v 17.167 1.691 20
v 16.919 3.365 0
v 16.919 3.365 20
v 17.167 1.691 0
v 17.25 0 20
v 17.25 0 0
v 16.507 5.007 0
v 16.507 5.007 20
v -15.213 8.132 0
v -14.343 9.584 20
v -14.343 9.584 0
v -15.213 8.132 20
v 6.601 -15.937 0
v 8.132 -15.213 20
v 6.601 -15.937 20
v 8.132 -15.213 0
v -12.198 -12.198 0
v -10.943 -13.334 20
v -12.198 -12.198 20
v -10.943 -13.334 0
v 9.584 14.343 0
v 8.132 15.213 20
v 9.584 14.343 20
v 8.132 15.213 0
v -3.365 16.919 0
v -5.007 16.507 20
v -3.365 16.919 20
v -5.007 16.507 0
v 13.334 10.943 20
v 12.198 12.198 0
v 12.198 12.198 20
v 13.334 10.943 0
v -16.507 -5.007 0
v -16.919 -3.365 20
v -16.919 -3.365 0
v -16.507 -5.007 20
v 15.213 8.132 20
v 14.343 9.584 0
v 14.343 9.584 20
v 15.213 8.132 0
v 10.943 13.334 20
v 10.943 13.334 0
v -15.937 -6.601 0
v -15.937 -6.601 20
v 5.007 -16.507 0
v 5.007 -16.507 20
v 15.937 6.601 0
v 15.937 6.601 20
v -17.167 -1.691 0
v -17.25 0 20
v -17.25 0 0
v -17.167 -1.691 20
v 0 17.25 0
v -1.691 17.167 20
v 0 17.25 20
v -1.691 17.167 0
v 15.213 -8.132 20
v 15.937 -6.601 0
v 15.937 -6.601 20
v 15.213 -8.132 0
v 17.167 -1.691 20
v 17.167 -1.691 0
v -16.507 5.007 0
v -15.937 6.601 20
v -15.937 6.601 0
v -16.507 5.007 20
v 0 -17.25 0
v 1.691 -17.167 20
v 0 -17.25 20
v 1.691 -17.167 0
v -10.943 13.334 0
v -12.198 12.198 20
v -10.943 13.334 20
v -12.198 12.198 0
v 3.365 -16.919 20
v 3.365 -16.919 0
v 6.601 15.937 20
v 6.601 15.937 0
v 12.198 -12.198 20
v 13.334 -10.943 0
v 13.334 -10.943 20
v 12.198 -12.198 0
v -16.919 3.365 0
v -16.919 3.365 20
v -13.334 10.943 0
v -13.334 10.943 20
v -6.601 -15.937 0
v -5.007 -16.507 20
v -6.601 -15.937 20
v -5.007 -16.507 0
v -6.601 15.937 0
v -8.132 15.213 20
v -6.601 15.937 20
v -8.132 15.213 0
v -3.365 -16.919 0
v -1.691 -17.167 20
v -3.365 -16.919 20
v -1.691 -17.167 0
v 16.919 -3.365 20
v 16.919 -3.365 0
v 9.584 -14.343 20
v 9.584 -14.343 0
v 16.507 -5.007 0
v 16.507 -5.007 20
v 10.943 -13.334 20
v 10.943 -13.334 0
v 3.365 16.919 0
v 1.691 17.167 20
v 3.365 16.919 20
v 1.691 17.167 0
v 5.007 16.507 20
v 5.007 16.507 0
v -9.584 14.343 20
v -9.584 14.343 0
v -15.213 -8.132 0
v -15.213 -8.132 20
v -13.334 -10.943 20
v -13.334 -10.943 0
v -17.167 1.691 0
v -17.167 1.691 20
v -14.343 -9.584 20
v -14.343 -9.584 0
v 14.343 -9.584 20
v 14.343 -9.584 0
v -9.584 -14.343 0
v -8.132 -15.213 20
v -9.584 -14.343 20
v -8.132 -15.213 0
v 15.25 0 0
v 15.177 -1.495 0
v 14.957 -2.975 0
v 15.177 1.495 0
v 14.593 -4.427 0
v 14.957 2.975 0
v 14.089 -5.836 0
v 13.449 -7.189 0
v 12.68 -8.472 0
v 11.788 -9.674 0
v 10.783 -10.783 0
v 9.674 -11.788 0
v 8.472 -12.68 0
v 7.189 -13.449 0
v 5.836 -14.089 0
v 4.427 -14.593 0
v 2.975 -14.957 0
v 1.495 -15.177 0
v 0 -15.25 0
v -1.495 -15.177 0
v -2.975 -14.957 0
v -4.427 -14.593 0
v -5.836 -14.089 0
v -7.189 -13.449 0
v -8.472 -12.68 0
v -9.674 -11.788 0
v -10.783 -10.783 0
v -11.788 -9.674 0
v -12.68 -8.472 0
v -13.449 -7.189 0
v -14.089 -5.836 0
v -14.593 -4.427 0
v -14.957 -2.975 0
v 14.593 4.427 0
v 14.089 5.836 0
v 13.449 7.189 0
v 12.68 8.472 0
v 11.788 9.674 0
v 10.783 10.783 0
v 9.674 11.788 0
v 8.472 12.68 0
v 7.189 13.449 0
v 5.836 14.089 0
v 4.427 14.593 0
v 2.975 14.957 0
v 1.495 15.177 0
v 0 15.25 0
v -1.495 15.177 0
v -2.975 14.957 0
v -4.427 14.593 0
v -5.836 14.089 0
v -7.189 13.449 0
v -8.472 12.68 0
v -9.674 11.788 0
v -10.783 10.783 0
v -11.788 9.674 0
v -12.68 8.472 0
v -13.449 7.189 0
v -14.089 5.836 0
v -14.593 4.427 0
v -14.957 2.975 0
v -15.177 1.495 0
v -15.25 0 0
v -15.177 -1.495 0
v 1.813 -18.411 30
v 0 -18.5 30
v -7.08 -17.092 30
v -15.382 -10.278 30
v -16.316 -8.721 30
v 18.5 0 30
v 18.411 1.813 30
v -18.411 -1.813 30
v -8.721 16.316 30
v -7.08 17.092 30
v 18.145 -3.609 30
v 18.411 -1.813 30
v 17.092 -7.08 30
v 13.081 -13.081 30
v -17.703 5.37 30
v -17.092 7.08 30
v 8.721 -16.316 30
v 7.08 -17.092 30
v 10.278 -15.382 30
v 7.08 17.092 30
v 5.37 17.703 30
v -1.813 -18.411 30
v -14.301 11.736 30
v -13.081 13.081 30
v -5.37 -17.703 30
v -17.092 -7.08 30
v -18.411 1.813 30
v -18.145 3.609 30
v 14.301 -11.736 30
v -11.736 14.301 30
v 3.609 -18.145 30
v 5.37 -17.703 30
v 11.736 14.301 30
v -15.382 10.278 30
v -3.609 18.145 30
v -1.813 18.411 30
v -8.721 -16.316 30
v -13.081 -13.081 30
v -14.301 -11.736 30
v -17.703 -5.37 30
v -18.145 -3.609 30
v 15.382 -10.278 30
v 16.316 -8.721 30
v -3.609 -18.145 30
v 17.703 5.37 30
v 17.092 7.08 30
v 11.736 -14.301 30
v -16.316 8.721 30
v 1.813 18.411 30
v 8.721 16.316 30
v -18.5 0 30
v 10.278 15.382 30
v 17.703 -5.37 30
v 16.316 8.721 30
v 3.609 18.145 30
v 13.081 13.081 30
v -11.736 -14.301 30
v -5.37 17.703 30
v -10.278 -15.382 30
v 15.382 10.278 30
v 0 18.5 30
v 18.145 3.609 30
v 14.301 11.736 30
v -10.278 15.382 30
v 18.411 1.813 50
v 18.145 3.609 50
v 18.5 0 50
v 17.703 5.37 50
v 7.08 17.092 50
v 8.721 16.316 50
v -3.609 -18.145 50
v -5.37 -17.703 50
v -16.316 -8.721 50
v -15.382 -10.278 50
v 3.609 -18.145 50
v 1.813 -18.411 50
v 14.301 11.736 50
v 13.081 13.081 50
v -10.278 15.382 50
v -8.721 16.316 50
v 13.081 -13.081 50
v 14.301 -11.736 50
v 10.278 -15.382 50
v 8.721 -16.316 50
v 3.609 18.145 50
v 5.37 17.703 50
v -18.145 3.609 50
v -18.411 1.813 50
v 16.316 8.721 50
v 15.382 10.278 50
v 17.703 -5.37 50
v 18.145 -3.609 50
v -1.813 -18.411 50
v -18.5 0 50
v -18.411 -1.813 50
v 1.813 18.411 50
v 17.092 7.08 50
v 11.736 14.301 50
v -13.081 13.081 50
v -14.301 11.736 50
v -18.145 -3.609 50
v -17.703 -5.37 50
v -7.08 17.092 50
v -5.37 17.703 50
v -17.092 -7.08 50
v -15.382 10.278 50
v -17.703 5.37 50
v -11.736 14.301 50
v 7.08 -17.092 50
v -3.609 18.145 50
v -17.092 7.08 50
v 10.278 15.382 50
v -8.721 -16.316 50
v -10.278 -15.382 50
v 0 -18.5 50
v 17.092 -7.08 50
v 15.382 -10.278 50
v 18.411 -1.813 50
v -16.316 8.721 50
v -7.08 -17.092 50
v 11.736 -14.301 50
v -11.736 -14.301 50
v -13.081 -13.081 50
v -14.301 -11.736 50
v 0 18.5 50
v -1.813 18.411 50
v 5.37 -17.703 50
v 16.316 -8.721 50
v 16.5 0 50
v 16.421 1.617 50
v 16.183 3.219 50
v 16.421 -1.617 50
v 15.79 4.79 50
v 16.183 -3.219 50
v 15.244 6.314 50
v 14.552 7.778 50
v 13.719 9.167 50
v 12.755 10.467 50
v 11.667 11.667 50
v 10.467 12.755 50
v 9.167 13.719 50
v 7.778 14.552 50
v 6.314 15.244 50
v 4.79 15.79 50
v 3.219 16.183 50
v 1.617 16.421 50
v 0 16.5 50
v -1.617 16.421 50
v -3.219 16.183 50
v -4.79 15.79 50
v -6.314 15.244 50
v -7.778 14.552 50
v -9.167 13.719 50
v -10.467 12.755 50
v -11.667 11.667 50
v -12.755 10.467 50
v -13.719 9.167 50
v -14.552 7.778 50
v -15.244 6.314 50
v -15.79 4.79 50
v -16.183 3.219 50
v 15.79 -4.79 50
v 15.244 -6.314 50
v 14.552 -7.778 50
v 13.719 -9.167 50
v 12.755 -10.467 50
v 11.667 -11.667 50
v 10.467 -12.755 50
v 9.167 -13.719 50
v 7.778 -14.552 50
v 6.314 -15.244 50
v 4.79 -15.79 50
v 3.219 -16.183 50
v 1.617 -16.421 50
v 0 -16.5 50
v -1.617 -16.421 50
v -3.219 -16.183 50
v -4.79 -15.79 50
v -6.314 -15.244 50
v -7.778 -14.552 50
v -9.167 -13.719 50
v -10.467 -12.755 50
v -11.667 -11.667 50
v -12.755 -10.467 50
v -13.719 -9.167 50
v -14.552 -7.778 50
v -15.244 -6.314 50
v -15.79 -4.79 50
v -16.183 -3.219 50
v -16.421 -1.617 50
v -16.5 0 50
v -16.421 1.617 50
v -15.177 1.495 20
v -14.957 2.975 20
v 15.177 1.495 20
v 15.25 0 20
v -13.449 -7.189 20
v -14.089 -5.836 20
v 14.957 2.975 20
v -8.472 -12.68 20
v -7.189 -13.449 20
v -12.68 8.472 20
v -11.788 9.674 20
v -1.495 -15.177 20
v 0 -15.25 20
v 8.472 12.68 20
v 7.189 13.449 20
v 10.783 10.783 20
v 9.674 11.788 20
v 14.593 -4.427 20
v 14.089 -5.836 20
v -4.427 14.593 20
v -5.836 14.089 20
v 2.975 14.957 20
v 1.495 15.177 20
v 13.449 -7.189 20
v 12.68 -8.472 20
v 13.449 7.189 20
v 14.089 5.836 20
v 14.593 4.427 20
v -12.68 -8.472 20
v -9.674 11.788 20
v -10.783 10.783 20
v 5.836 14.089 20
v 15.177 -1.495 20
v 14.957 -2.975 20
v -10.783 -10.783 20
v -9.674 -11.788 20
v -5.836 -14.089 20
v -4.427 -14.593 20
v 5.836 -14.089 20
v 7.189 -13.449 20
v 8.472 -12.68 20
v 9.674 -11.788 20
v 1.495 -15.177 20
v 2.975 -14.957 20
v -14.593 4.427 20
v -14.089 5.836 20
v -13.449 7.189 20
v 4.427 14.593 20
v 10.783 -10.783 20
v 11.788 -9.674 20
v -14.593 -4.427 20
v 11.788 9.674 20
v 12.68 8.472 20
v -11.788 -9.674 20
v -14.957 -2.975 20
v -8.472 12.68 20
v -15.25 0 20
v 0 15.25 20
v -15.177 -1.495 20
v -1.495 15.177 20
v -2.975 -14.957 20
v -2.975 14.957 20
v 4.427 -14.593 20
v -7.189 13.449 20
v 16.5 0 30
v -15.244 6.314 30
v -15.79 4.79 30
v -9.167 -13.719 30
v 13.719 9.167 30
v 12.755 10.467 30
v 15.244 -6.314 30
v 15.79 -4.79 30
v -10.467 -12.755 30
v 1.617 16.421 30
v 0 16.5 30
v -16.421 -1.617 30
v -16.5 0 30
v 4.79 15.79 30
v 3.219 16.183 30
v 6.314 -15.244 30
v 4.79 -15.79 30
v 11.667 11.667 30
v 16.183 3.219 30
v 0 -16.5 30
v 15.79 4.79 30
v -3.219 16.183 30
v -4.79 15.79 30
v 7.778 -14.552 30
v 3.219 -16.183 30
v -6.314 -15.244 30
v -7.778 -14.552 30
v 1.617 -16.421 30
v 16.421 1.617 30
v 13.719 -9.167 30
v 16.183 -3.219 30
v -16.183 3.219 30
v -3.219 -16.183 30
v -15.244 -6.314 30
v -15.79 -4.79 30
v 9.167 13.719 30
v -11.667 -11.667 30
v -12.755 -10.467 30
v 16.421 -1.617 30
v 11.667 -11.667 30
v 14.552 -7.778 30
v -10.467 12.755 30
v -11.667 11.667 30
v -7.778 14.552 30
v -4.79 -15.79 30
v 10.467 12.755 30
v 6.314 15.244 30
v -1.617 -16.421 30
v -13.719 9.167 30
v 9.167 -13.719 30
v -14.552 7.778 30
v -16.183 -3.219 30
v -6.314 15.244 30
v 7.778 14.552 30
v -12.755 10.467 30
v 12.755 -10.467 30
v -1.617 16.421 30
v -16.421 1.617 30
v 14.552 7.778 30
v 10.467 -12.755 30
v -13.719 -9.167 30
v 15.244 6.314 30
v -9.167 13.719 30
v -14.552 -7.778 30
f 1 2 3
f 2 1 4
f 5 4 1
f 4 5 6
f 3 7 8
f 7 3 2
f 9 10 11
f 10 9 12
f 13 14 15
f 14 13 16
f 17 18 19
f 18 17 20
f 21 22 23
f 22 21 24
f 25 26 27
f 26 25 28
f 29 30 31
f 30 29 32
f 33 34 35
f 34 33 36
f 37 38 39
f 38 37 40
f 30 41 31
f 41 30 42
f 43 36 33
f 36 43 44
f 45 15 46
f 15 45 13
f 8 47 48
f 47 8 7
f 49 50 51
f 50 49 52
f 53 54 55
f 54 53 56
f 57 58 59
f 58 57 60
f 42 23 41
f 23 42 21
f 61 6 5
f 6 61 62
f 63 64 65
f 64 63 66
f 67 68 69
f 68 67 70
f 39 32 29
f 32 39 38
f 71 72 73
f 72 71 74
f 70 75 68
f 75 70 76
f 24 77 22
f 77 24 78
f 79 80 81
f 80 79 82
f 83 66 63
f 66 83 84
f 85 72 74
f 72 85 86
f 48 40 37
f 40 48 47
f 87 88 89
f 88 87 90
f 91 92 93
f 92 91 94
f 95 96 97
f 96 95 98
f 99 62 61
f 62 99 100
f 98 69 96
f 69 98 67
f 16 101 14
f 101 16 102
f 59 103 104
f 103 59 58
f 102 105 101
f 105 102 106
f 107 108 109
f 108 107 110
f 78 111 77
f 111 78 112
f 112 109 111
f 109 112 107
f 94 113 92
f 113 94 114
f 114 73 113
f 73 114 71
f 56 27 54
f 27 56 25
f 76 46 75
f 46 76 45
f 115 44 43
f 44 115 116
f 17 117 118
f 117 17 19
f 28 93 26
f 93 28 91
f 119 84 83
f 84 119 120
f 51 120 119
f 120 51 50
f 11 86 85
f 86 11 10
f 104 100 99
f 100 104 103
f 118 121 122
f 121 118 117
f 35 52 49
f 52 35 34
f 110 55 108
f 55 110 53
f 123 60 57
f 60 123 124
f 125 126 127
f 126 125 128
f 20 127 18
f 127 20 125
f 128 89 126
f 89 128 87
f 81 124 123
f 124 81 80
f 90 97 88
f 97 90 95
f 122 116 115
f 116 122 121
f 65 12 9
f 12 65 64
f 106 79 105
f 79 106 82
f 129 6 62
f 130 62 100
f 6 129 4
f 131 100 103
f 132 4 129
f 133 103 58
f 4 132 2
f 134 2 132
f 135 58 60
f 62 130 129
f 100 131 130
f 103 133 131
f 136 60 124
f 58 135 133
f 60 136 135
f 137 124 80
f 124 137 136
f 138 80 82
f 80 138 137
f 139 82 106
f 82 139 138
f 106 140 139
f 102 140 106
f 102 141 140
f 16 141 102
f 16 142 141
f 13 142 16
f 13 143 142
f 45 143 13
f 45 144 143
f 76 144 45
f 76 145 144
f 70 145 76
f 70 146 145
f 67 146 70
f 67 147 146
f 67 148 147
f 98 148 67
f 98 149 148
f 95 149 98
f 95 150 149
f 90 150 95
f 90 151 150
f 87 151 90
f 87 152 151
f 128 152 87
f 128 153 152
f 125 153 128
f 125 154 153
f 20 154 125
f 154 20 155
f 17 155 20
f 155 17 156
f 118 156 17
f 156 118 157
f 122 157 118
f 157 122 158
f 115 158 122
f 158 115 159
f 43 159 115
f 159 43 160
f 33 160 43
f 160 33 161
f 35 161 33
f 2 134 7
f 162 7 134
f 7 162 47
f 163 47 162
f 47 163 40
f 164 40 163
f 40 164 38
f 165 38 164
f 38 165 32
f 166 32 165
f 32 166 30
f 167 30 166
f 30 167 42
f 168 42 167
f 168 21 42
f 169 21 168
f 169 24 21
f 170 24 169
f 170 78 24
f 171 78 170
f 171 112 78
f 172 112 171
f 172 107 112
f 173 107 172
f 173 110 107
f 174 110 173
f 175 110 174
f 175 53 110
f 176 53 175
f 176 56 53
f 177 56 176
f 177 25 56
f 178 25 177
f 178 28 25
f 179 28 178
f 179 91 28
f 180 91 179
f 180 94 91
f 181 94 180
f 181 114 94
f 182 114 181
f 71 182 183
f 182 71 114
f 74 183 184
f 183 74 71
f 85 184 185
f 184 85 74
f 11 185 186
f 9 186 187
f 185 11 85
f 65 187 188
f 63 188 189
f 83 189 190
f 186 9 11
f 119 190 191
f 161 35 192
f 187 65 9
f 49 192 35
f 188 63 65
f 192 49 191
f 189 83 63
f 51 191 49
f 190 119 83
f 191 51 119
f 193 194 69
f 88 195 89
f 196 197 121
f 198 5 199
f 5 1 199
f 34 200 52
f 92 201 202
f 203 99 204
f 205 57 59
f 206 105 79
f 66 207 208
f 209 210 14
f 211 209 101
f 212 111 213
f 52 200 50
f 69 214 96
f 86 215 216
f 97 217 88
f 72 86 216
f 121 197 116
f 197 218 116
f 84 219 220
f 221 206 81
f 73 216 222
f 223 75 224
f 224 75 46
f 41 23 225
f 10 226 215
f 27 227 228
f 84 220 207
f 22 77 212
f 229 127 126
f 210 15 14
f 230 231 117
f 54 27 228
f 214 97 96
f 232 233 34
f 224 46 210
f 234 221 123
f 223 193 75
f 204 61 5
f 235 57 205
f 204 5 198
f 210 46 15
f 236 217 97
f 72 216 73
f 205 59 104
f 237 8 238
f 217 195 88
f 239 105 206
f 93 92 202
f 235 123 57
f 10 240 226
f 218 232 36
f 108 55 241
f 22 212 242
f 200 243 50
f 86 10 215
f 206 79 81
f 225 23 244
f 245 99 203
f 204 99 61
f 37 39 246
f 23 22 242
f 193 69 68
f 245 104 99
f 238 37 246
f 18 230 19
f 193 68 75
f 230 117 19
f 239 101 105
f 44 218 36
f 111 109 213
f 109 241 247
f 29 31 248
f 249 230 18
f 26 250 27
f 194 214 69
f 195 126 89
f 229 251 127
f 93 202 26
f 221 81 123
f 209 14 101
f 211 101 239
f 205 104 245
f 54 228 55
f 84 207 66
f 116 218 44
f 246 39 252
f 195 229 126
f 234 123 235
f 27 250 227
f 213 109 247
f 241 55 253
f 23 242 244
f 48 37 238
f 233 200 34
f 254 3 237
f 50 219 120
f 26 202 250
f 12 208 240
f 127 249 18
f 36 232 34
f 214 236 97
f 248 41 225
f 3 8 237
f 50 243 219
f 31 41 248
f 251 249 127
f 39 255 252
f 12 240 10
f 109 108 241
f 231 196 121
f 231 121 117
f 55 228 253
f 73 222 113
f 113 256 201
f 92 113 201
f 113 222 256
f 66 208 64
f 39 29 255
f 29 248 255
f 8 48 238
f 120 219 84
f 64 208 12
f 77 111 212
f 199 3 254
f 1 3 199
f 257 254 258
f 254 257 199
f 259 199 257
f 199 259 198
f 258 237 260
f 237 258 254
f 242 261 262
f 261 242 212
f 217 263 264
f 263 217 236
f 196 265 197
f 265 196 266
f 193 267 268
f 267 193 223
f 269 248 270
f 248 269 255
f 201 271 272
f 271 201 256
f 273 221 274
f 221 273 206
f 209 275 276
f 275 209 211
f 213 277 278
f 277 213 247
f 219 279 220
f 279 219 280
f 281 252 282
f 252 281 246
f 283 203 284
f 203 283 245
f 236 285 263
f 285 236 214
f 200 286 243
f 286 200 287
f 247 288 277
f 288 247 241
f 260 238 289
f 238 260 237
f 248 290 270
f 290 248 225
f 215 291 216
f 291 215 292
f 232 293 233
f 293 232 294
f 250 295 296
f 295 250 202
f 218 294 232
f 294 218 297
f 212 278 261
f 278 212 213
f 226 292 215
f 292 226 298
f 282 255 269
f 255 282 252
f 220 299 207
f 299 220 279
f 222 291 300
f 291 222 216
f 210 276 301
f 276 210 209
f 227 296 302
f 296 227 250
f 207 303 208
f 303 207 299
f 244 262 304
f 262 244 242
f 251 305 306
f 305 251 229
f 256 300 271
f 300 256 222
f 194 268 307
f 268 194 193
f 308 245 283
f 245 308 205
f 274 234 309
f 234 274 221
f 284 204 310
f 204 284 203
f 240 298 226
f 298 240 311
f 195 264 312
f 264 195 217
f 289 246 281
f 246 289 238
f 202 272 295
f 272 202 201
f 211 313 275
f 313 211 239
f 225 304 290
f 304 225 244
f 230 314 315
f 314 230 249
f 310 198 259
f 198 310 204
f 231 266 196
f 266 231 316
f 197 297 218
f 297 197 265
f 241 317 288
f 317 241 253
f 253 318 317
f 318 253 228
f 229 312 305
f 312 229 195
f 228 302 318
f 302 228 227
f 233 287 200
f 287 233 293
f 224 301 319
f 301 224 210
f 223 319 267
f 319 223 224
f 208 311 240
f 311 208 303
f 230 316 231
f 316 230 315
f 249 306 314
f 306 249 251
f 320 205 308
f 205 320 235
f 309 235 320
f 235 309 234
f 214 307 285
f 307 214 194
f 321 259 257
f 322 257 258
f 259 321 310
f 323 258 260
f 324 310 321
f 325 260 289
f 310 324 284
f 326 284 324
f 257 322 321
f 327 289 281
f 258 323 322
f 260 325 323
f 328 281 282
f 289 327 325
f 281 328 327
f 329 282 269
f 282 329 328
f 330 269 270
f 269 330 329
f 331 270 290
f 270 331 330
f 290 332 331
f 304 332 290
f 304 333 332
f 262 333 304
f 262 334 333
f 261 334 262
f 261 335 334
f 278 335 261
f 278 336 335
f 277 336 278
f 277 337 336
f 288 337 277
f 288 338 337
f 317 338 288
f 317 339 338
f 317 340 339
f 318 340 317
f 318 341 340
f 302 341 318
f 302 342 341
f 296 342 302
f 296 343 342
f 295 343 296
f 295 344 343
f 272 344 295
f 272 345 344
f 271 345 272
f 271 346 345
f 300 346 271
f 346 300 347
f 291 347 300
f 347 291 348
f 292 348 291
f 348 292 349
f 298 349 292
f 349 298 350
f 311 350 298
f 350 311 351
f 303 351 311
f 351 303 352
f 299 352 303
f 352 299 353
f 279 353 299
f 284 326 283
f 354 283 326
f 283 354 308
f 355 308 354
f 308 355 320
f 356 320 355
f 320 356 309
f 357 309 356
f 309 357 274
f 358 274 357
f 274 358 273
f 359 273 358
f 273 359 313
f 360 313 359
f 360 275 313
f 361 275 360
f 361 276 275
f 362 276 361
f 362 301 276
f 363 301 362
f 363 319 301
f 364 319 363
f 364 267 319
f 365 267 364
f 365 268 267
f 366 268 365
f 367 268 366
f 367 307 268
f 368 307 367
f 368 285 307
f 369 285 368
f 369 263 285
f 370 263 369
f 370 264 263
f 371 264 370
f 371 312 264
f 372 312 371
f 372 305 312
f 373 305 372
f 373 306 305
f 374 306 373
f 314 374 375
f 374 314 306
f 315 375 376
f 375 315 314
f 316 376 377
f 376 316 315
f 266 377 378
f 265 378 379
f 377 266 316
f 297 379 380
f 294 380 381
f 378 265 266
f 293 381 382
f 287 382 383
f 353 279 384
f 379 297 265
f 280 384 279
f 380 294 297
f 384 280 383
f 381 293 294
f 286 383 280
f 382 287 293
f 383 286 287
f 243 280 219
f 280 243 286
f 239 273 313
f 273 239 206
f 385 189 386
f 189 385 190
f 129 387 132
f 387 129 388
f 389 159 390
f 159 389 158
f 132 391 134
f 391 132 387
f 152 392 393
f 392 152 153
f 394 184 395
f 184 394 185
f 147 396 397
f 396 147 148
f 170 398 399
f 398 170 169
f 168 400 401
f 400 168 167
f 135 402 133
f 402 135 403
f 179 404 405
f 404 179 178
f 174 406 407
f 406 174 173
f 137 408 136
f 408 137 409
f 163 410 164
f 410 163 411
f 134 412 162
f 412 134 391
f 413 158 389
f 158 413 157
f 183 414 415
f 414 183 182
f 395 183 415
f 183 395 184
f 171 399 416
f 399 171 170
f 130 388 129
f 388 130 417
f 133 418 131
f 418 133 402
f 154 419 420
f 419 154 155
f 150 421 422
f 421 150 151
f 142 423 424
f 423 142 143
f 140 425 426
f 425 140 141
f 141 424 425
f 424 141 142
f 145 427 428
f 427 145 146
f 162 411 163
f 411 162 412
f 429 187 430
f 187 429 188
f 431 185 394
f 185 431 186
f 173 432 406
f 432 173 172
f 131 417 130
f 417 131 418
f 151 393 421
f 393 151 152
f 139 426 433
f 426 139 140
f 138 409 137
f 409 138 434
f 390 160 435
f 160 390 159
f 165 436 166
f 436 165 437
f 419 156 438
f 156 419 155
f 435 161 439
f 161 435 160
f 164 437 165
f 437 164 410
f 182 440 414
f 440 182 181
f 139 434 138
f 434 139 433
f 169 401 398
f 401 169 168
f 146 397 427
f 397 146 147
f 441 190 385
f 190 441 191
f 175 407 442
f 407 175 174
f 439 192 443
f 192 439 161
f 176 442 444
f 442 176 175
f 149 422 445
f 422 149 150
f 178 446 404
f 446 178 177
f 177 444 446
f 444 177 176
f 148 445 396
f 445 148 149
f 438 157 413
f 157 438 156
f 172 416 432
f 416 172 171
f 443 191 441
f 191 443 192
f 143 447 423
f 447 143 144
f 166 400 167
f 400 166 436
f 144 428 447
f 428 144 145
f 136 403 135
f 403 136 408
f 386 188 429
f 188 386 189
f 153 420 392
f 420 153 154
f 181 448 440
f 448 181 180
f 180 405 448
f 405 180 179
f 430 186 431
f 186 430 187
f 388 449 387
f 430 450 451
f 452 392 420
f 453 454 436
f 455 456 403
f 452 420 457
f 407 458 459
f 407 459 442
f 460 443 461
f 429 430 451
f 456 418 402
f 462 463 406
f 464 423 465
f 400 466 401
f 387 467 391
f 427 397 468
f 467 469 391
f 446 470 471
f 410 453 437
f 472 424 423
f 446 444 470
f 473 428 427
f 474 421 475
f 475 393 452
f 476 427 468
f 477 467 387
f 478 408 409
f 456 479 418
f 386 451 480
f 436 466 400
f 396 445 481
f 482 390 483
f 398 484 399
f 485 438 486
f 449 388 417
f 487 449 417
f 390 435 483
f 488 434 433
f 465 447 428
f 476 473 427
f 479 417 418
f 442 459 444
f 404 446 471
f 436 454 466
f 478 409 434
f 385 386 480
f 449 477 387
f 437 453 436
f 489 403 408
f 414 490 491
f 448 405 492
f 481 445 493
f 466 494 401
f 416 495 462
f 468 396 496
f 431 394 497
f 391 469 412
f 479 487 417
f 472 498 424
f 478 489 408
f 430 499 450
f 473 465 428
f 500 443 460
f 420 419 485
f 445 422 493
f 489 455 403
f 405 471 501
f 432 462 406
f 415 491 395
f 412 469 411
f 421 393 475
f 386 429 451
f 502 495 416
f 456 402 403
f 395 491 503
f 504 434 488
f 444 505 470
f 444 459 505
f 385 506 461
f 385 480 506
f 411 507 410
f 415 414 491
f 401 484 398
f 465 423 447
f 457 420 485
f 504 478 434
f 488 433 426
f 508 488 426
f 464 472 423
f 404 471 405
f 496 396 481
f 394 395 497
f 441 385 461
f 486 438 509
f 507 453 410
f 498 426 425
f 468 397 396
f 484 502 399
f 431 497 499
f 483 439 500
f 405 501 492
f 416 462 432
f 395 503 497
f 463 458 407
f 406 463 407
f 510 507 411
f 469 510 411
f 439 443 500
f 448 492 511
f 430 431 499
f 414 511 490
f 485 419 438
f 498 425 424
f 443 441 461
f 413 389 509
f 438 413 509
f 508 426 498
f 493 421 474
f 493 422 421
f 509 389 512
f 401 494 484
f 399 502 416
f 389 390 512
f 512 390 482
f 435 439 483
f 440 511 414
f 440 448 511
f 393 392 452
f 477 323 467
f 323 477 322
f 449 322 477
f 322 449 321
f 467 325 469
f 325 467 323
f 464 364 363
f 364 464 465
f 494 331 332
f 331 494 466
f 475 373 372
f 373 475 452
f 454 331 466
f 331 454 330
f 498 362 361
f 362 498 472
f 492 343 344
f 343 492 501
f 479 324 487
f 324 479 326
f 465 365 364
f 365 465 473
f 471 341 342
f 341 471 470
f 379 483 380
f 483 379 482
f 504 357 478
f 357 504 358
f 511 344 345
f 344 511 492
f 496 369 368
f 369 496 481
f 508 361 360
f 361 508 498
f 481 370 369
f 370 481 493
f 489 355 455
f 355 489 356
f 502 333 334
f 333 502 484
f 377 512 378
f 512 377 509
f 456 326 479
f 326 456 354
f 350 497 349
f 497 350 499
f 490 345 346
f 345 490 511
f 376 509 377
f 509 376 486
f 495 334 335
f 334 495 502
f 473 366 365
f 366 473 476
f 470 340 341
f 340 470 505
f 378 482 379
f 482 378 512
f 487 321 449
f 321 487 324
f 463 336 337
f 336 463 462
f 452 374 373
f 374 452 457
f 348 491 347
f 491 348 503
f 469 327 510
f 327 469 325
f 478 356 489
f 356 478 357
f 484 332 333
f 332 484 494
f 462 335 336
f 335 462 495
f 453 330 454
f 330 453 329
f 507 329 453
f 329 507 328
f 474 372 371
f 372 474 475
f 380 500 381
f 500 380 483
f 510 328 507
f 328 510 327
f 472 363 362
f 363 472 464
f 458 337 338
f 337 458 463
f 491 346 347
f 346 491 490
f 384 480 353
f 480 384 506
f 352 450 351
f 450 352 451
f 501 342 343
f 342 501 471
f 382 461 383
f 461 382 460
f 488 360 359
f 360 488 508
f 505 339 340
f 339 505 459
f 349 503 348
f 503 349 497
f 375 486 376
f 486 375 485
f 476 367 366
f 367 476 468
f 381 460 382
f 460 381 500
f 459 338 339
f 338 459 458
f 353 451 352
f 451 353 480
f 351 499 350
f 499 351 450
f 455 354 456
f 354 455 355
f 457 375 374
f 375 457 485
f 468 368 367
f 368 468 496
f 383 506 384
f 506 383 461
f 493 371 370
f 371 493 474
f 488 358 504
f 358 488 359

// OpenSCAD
/**
 * Hose adapter for Makita vacuums and dust extractors.
 *
 * This adapter fits inside tool dust ports and enables them to be connected to
 * Makita vacuums. All dimensions are in millimeters.
 */

/* [Adapter] */
// Inside diameter of the tool dust port (the default fits the DeWalt DW618)
Tool_Port_Diameter = 34.5;

// Inside diameter of the Makita vacuum hose connection
Hose_Port_Diameter = 37;

// Wall thickness of the adapter shell
Wall_Thickness = 2;

// Length of each cylindrical end section
End_Length = 20;

// Length of the tapered middle section
Taper_Length = 10;

/* [Hidden] */
$fn = 64;
EPSILON = 0.02;

assert(Wall_Thickness > 0, "Wall_Thickness must be positive");
assert(2 * Wall_Thickness < Tool_Port_Diameter, "Wall_Thickness must be less than half Tool_Port_Diameter");
assert(2 * Wall_Thickness < Hose_Port_Diameter, "Wall_Thickness must be less than half Hose_Port_Diameter");

module hose_adapter(d1, d2, thickness) {
  module shell(d1, d2) {
    cylinder(h = End_Length, d = d1);
    translate([0, 0, End_Length])
      cylinder(h = Taper_Length, d1 = d1, d2 = d2);
    translate([0, 0, End_Length + Taper_Length])
      cylinder(h = End_Length, d = d2);
  }

  difference() {
    shell(d1, d2);
    translate([0, 0, -EPSILON]) {
      cylinder(h = End_Length + EPSILON, d = d1 - 2 * thickness);
      translate([0, 0, End_Length + EPSILON])
        cylinder(h = Taper_Length, d1 = d1 - 2 * thickness, d2 = d2 - 2 * thickness);
      translate([0, 0, End_Length + EPSILON + Taper_Length])
        cylinder(h = End_Length + EPSILON, d = d2 - 2 * thickness);
    }
  }
}

hose_adapter(
  Tool_Port_Diameter,
  Hose_Port_Diameter,
  Wall_Thickness
);
